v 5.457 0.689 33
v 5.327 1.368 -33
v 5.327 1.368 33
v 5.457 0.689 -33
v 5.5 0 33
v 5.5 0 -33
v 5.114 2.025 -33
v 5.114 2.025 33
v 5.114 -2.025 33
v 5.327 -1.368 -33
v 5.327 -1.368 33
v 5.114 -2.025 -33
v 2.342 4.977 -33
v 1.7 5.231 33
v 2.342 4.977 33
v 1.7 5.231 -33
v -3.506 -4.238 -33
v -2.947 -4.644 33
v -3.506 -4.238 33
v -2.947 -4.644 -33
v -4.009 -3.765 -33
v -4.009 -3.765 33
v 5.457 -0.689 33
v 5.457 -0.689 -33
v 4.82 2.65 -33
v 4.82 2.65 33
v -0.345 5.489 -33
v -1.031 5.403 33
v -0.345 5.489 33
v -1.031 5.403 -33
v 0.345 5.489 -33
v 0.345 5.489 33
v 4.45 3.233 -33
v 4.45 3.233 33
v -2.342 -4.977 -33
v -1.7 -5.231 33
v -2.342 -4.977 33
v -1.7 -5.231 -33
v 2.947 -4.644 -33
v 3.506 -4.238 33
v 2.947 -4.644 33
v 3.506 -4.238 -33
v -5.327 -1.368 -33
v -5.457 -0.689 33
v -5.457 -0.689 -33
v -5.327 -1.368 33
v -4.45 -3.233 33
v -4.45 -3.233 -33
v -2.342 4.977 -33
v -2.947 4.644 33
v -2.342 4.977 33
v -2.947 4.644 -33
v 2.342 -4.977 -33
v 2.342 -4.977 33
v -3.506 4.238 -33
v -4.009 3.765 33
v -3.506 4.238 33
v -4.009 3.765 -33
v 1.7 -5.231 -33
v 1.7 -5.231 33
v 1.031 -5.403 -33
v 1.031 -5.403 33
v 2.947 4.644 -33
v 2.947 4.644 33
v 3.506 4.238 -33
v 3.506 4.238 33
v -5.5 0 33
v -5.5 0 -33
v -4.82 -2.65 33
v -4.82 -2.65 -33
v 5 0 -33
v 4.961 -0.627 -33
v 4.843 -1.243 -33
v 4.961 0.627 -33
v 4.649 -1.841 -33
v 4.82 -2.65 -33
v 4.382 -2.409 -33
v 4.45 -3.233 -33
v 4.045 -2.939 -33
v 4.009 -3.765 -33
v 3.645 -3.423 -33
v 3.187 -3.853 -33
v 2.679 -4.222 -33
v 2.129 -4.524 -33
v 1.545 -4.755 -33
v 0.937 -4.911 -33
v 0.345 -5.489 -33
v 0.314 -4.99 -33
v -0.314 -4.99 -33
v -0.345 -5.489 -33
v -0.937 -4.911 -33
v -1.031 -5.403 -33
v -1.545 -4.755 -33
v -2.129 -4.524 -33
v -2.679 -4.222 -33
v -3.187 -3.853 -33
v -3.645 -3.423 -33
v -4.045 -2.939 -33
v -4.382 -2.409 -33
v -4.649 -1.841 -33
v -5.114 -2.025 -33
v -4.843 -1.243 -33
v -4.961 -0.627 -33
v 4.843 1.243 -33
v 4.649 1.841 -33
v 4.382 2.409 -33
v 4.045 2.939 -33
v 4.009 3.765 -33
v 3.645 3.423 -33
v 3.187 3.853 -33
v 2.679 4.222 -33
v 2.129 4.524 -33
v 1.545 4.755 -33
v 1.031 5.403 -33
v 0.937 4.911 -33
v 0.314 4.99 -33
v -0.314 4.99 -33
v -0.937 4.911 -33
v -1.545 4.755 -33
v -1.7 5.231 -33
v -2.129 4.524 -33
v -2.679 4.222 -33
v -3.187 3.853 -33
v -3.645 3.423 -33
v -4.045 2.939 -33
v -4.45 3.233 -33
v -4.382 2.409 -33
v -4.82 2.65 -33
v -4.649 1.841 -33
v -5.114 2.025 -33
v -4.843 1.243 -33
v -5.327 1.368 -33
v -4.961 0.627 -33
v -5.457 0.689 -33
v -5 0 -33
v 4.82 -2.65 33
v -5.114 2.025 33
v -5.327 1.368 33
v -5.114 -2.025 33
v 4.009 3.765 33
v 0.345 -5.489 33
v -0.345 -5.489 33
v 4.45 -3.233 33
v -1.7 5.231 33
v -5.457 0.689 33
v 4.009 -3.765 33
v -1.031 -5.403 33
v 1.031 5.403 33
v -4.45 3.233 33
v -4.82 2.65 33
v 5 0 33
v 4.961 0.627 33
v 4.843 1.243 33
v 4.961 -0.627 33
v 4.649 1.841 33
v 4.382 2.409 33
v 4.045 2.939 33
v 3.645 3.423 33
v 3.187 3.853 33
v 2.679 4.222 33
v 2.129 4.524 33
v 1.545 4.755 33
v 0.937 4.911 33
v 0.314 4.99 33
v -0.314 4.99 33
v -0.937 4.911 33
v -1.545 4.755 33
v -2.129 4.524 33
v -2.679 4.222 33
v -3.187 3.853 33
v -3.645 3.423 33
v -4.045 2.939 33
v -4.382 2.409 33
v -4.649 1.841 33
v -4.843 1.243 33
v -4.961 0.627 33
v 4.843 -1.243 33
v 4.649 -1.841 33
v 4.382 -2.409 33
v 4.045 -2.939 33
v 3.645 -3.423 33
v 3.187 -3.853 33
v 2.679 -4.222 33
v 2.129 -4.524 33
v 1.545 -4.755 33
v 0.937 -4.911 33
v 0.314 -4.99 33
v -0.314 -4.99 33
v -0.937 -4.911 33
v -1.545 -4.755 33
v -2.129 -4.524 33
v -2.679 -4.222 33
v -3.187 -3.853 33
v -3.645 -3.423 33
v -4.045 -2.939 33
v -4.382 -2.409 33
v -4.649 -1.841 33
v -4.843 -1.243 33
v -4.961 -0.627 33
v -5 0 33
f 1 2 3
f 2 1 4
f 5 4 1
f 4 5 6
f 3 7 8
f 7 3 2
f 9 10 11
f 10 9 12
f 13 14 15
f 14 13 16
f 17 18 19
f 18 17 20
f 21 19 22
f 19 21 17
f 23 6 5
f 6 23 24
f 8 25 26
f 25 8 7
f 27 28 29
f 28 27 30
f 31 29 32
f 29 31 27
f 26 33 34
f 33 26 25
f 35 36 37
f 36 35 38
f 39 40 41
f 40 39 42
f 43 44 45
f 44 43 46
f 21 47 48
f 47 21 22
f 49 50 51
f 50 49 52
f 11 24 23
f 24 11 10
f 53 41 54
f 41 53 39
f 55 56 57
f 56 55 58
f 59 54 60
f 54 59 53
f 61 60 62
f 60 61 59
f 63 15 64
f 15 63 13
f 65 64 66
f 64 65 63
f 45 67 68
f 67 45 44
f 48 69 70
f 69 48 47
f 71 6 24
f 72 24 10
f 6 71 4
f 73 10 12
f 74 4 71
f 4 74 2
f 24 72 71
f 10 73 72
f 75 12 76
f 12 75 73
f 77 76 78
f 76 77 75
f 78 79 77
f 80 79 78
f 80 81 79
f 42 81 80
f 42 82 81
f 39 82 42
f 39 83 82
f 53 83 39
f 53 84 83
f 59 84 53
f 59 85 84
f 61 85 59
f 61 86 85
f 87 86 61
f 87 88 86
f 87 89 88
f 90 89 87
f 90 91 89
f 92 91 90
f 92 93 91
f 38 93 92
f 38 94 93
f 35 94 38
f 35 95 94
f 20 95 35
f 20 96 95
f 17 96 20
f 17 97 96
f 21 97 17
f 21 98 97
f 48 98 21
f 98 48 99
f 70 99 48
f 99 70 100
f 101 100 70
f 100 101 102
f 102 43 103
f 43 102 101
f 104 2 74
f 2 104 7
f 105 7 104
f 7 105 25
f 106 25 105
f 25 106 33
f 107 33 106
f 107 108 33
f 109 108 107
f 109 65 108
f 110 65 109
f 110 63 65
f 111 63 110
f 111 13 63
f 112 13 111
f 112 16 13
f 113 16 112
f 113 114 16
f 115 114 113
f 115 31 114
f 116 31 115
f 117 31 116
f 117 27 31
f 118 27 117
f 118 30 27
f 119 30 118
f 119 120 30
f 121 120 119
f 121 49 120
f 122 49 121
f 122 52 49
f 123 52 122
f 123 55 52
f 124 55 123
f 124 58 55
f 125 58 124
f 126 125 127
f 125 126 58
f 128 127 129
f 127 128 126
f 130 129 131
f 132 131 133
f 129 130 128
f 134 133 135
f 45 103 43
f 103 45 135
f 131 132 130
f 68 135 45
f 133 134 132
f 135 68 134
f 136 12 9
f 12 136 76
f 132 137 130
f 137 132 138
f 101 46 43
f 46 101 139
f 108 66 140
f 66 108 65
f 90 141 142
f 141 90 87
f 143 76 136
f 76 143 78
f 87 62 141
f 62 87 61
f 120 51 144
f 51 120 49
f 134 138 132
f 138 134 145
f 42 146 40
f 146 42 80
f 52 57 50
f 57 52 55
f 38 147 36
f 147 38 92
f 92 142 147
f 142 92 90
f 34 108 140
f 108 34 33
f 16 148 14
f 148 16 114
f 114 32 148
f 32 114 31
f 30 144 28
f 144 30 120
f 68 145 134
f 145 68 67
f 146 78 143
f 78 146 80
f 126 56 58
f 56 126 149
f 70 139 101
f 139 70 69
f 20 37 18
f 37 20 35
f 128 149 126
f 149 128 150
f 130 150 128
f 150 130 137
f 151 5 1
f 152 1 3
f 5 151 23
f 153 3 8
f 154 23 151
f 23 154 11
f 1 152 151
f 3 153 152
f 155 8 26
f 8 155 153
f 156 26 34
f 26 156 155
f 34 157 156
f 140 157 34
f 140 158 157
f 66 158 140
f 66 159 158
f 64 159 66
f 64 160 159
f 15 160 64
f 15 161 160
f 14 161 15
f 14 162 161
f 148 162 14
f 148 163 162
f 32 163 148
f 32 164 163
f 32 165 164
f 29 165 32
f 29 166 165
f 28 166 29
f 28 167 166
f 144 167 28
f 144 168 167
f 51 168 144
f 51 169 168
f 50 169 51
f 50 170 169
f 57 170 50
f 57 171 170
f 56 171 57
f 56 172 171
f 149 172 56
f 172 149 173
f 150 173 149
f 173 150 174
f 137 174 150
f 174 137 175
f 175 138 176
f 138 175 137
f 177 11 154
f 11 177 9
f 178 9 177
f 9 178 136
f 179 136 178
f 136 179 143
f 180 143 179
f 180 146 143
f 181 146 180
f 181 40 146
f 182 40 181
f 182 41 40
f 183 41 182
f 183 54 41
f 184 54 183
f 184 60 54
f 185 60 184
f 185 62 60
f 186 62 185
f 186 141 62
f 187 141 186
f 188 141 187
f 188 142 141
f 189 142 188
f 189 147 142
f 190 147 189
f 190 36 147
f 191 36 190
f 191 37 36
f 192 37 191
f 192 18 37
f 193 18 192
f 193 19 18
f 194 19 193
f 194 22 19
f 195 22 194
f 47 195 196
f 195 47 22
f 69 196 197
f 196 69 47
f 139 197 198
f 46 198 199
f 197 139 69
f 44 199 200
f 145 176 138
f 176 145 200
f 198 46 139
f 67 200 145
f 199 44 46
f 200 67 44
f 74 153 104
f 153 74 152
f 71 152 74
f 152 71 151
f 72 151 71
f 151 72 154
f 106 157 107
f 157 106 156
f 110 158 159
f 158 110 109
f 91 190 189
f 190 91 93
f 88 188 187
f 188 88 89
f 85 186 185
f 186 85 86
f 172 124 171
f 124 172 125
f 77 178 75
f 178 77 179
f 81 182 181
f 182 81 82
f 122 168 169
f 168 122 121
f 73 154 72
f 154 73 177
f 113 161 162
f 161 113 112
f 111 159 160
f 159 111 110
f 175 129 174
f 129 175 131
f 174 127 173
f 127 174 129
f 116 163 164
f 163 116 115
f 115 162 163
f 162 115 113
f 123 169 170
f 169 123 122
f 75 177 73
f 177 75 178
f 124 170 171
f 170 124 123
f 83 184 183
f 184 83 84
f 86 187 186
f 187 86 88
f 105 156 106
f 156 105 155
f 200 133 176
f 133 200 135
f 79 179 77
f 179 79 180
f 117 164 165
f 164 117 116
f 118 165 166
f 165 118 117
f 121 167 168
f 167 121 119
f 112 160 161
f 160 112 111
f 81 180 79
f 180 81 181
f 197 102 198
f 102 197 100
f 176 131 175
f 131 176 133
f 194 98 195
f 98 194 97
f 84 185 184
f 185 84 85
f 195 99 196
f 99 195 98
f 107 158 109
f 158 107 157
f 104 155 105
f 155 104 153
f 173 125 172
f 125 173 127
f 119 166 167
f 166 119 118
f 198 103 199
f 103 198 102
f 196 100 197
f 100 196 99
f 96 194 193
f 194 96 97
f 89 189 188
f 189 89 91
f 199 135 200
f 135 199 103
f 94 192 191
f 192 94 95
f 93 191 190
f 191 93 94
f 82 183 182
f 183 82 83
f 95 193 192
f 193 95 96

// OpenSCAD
$fn = 50;


difference() {
	union() {
		translate(v = [0, 0, -33.0000000000]) {
			cylinder(h = 66, r = 5.5000000000);
		}
	}
	union() {
		translate(v = [0, 0, -100.0000000000]) {
			cylinder(h = 200, r = 5.0000000000);
		}
	}
}
